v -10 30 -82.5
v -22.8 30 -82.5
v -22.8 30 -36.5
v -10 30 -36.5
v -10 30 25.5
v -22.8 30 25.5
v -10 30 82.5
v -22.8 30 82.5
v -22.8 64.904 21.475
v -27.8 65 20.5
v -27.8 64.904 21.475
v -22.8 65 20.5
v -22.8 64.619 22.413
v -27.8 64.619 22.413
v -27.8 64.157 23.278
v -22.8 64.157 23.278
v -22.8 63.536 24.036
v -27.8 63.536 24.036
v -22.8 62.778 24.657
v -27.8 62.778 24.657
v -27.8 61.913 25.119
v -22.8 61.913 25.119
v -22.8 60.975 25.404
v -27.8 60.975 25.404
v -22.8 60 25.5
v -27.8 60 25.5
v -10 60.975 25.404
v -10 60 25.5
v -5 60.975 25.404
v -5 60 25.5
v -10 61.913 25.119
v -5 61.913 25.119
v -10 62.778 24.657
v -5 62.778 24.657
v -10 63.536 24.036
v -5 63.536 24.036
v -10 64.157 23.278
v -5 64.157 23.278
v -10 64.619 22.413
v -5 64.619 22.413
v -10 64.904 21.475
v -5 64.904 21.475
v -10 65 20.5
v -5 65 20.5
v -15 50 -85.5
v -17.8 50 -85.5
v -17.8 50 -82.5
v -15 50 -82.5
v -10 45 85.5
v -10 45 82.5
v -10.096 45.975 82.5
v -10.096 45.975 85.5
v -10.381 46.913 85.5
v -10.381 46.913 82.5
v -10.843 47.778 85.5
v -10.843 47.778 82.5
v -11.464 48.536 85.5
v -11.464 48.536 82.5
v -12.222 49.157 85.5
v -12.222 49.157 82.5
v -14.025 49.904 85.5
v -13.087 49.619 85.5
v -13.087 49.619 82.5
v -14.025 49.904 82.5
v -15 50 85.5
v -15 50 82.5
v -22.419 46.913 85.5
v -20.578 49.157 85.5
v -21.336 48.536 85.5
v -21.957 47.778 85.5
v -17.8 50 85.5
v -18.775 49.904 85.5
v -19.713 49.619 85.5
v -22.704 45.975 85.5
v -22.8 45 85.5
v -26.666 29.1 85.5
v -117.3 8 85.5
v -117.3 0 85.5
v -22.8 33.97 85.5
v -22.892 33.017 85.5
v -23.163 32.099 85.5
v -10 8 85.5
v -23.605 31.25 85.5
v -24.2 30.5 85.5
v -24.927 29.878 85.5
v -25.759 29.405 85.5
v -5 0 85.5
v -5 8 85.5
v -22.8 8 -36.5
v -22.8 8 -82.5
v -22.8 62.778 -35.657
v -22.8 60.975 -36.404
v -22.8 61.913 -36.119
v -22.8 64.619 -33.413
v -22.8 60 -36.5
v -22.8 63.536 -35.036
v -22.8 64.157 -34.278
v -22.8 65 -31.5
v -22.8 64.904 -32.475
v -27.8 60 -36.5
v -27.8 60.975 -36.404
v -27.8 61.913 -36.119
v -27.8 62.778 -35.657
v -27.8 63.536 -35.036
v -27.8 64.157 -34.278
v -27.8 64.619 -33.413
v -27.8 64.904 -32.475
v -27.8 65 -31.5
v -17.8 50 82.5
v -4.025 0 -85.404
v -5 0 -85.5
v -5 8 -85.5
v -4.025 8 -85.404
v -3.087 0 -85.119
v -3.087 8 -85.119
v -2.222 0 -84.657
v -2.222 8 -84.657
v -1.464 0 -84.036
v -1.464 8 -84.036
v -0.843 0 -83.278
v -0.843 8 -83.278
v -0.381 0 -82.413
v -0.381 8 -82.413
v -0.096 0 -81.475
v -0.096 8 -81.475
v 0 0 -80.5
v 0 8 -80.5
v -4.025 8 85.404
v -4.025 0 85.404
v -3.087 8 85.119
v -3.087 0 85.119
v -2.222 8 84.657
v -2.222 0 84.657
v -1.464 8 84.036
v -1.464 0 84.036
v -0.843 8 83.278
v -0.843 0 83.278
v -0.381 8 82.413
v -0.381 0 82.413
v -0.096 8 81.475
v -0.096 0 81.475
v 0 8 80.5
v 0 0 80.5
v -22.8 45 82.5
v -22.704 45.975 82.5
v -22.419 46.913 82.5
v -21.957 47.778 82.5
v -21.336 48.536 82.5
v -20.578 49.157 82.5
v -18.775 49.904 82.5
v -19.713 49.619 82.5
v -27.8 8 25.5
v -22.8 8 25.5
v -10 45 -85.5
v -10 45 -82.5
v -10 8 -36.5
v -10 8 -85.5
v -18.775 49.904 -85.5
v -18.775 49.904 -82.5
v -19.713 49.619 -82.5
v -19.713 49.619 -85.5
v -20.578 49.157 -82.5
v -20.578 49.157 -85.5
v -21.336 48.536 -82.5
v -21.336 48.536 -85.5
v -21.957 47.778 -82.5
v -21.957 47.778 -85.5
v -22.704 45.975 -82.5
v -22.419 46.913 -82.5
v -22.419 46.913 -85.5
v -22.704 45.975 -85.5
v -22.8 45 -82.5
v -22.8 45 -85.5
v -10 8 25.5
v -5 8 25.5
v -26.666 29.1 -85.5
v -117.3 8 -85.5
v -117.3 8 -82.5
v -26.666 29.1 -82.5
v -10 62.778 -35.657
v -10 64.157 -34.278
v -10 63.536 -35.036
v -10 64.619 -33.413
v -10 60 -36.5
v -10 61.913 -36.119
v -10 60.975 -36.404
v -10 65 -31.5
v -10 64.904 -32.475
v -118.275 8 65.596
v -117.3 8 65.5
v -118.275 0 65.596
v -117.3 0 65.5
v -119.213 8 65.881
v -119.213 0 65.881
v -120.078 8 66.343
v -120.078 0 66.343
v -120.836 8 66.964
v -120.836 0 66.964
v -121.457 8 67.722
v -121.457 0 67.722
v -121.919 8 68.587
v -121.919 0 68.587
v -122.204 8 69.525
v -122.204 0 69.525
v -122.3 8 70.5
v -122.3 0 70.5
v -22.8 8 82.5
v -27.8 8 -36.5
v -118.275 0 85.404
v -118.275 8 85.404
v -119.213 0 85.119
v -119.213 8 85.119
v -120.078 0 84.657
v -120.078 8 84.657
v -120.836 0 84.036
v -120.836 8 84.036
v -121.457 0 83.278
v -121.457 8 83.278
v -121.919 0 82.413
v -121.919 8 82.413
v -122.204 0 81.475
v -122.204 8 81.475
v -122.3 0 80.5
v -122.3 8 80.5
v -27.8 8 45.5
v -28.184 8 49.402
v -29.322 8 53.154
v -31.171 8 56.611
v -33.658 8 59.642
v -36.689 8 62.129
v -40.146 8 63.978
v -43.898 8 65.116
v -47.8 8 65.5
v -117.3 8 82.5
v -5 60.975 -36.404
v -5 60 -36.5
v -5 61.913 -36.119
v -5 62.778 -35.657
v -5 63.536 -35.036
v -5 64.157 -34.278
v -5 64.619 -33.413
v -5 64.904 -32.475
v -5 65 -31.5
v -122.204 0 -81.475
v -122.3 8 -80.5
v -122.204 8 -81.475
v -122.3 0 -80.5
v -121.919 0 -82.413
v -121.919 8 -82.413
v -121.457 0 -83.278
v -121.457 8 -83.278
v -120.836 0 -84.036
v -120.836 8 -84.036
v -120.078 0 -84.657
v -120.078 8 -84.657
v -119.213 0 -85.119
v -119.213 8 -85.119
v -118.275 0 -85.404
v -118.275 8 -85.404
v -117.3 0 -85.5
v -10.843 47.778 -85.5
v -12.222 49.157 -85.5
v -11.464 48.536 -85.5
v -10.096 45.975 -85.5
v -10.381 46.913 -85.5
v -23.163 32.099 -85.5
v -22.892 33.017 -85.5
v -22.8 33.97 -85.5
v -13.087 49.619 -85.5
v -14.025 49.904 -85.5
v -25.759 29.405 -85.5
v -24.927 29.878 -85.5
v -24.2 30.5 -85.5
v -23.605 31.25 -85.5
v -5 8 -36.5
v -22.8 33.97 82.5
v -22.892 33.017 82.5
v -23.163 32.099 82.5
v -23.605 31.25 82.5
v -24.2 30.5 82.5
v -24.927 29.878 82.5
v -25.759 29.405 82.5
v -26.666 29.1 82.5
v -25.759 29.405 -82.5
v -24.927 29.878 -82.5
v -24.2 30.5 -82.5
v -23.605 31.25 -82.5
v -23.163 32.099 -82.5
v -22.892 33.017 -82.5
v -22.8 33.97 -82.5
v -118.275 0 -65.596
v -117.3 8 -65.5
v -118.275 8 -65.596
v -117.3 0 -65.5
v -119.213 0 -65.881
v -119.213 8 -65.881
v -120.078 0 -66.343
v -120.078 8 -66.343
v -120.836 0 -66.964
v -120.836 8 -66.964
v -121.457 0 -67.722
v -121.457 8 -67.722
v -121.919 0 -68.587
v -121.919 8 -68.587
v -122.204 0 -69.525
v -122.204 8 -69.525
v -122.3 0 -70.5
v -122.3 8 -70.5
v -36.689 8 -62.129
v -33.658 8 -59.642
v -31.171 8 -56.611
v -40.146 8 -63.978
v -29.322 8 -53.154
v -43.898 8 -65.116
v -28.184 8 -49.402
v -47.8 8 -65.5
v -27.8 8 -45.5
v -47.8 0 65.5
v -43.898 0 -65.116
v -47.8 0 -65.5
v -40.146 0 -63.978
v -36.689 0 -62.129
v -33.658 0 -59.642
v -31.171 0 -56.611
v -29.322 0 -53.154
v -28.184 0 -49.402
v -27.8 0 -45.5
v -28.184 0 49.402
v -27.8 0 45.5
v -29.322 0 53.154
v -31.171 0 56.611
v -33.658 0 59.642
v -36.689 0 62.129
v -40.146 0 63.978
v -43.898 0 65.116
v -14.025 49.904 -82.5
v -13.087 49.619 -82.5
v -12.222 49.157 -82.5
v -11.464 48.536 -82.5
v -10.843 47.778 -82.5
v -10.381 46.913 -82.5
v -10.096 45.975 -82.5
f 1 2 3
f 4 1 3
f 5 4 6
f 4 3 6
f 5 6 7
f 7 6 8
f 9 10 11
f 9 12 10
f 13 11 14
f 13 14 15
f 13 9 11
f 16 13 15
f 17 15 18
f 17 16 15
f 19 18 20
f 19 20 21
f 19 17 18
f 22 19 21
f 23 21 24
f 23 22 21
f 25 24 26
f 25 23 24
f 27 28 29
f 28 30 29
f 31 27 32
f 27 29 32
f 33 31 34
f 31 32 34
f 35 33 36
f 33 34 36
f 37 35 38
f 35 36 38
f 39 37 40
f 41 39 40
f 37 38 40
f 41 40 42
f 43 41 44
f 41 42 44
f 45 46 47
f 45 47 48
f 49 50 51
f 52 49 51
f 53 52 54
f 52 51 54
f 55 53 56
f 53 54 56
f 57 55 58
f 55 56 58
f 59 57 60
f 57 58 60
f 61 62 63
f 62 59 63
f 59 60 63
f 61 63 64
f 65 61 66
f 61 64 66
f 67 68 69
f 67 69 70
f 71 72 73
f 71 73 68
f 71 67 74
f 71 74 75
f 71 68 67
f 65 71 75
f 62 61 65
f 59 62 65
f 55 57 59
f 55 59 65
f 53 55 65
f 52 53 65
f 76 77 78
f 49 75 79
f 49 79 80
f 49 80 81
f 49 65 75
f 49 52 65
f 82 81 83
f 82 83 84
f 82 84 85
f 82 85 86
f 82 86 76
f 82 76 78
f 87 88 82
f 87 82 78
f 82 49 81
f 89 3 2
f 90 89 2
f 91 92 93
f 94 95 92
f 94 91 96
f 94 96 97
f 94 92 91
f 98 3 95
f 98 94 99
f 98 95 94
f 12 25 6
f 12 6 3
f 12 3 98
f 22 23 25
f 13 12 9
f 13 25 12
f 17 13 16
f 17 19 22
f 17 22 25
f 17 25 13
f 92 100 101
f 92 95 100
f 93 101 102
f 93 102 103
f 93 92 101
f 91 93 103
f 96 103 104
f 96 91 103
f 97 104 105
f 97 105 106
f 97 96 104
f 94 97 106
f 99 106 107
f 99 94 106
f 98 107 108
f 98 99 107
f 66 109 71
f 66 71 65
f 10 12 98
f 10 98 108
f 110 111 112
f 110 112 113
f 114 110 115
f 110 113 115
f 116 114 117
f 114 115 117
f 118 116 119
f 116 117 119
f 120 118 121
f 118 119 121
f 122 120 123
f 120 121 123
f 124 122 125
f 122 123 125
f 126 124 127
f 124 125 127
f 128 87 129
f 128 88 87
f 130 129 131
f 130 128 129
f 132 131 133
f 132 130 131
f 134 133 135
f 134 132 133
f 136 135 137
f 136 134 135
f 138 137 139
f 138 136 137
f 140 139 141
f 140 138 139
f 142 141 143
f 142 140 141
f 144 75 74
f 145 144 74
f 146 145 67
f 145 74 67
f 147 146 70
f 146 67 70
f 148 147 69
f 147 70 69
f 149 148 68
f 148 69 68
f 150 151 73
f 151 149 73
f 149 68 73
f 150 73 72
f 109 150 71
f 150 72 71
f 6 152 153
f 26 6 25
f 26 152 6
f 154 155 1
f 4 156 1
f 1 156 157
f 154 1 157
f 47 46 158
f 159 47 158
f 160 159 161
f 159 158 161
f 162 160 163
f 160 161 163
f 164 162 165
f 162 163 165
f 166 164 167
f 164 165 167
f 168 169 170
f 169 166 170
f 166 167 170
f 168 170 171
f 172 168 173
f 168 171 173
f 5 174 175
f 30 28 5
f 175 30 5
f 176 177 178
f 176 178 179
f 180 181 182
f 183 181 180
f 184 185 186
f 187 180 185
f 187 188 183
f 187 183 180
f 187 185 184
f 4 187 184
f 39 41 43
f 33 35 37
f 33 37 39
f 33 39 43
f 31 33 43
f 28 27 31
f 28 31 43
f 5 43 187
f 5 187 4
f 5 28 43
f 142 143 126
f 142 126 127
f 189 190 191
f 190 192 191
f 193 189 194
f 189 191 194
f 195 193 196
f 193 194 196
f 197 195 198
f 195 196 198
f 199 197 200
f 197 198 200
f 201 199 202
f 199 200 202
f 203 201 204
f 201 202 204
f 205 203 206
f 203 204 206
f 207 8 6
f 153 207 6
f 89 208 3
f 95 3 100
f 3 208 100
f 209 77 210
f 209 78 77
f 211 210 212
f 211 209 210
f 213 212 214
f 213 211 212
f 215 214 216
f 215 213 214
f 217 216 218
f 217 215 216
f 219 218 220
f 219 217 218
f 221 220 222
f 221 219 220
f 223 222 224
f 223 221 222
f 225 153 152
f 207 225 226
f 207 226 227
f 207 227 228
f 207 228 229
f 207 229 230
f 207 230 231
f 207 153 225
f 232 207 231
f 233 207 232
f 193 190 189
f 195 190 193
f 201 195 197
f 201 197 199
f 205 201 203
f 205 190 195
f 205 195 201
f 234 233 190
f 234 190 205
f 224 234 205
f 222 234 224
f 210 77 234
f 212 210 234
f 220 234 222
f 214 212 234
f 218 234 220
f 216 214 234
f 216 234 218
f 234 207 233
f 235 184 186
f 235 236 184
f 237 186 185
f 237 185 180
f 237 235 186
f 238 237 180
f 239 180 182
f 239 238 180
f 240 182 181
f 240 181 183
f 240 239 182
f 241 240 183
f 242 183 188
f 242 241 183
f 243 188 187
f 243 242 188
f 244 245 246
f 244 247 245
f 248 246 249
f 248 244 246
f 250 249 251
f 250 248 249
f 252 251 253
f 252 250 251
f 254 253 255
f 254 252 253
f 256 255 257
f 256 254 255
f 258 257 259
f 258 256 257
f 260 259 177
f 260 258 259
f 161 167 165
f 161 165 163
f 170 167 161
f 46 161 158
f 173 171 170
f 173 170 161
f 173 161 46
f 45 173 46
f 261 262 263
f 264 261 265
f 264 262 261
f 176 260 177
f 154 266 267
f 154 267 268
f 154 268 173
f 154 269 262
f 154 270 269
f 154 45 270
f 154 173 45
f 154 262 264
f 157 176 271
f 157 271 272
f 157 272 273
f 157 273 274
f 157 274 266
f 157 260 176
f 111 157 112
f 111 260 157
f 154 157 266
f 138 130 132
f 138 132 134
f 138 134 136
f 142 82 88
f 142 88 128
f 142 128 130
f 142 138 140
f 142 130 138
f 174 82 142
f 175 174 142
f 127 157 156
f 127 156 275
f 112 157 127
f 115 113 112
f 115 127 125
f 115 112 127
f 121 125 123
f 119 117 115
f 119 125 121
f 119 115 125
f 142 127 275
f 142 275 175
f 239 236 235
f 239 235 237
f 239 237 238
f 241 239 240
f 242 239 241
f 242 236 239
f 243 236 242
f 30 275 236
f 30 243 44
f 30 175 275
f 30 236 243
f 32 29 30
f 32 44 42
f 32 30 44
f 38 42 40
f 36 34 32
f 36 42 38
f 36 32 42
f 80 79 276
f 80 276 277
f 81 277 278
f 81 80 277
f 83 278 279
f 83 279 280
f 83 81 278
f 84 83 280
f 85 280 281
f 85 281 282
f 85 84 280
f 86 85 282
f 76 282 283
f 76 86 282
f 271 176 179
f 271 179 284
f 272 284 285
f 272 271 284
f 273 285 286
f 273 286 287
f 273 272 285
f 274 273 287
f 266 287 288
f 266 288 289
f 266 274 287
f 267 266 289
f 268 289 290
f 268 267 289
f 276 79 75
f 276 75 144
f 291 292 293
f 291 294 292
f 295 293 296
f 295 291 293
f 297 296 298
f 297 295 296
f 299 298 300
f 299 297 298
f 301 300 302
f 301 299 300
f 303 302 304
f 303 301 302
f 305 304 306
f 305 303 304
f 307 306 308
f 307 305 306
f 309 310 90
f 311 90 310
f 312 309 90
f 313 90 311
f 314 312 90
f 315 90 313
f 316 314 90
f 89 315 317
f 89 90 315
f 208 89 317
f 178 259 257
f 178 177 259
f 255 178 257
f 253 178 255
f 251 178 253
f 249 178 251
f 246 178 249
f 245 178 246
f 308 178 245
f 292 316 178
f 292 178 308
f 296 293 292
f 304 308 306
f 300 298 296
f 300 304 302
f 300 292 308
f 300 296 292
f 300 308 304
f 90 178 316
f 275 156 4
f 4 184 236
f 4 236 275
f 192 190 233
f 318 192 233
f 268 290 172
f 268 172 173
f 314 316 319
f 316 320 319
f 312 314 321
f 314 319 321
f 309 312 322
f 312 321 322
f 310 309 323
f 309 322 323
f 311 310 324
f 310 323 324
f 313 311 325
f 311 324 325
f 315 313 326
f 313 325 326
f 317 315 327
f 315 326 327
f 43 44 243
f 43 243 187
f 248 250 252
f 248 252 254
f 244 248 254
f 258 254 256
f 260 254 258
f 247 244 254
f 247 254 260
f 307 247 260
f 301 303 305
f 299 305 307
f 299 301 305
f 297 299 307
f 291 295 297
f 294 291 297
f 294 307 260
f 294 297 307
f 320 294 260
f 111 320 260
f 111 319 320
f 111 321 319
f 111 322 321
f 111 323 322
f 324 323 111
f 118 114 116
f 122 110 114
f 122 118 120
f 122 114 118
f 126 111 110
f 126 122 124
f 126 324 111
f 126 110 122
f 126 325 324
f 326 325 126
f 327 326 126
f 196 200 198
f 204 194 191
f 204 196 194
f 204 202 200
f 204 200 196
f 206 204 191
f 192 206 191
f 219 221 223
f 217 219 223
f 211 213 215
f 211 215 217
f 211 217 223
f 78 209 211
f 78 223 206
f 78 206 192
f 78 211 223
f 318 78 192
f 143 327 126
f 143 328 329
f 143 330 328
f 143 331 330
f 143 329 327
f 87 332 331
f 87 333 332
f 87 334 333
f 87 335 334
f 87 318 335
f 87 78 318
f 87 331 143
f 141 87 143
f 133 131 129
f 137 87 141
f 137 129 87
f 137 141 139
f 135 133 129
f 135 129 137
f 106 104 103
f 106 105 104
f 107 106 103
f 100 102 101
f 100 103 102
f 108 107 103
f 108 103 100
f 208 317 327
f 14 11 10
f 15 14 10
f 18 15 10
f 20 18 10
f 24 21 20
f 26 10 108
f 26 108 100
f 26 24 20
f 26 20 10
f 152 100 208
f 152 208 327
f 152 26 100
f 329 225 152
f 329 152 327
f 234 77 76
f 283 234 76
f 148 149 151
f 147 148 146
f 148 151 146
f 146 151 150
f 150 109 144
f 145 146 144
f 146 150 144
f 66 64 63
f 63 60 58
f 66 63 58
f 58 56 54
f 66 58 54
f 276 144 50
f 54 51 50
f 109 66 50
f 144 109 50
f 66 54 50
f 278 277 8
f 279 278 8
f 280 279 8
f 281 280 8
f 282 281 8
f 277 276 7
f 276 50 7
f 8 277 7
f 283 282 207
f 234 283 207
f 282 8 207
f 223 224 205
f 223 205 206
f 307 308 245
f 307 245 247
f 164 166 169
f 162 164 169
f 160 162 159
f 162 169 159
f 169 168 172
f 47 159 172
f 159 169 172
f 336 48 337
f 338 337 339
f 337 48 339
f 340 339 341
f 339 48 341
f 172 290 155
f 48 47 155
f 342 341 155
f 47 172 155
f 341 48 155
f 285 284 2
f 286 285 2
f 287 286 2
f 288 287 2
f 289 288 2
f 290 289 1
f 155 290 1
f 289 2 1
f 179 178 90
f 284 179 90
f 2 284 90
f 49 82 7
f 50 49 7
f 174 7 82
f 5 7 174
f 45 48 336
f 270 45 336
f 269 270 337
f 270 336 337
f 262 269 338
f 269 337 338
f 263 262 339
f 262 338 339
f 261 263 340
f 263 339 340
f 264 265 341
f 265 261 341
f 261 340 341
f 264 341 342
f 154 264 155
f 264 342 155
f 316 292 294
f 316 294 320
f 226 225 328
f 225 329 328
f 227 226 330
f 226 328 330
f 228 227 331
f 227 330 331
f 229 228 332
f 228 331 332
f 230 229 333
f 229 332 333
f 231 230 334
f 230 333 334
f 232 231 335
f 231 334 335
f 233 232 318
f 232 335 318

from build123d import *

# Parameters (mm, degrees)
P_IDAT_VYSUNUT_M1_DEPTH  = 85.5
SKICA2_W                 = 49
SKICA2_H                 = 35
SKICA2_W_2               = 60
ODEBRAT_VYSUNUT_M1_DEPTH = 144.057680675
SKICA3_W                 = 5
SKICA3_H                 = 49
SKICA3_H_2               = 60
ODEBRAT_VYSUNUT_M2_DEPTH = 22
SKICA4_W                 = 94.5
SKICA4_H                 = 131
ODEBRAT_VYSUNUT_M3_DEPTH = 160.73897458
ZAOBLIT1_R               = 5
ZAOBLIT2_R               = 20
ZAOBLIT3_R               = 5
P_IDAT_VYSUNUT_M2_DEPTH  = 3
SKICA6_W                 = 12.8
SKICA6_H                 = 3
P_IDAT_VYSUNUT_M3_DEPTH  = 20
ZAOBLIT4_R               = 5


with BuildPart() as part:
    # Skica1 → Přidat vysunutím1 (new, symmetric)
    with BuildSketch(Plane.XY):
        Polygon((-27.8, 65), (-27.8, 8), (-122.3, 8), (-122.3, 0), (0, 0), (0, 8), (-5, 8), (-5, 65), (-10, 65), (-10, 30), (-22.8, 30), (-22.8, 65), align=None)
    extrude(amount=P_IDAT_VYSUNUT_M1_DEPTH, both=True)

    # Skica2 → Odebrat vysunutím1 (cut, through all)
    with BuildSketch(Plane.ZY.offset(27.8)):
        with Locations((-61, 47.5)):
            Rectangle(SKICA2_W, SKICA2_H)
        with Locations((55.5, 47.5)):
            Rectangle(SKICA2_W_2, SKICA2_H)
    extrude(amount=-ODEBRAT_VYSUNUT_M1_DEPTH, mode=Mode.SUBTRACT)

    # Skica3 → Odebrat vysunutím2 (cut)
    with BuildSketch(Plane(origin=(0, 30, 0), x_dir=(1, 0, 0), z_dir=(0, 1, 0))):
        with Locations((-25.3, 61)):
            Rectangle(SKICA3_W, SKICA3_H)
        with Locations((-7.5, 61)):
            Rectangle(SKICA3_W, SKICA3_H)
        with Locations((-25.3, -55.5)):
            Rectangle(SKICA3_W, SKICA3_H_2)
        with Locations((-7.5, -55.5)):
            Rectangle(SKICA3_W, SKICA3_H_2)
    extrude(amount=-ODEBRAT_VYSUNUT_M2_DEPTH, mode=Mode.SUBTRACT)

    # Skica4 → Odebrat vysunutím3 (cut, through all)
    with BuildSketch(Plane(origin=(0, 8, 0), x_dir=(1, 0, 0), z_dir=(0, 1, 0))):
        with Locations((-75.05, 0)):
            Rectangle(SKICA4_W, SKICA4_H)
    extrude(amount=-ODEBRAT_VYSUNUT_M3_DEPTH, mode=Mode.SUBTRACT)

    # Zaoblit1
    zaoblit1_edges = [part.edges().sort_by_distance(p)[0] for p in [
        (0, 4, -85.5),
        (-122.3, 4, 65.5),
        (-122.3, 4, -65.5),
        (-122.3, 4, -85.5),
        (-122.3, 4, 85.5),
        (0, 4, 85.5),
    ]]
    fillet(zaoblit1_edges, radius=ZAOBLIT1_R)

    # Zaoblit2
    zaoblit2_edges = [part.edges().sort_by_distance(p)[0] for p in [
        (-27.8, 4, -65.5),
        (-27.8, 4, 65.5),
    ]]
    fillet(zaoblit2_edges, radius=ZAOBLIT2_R)

    # Zaoblit3
    zaoblit3_edges = [part.edges().sort_by_distance(p)[0] for p in [
        (-7.5, 65, -36.5),
        (-25.3, 65, -36.5),
        (-25.3, 65, 25.5),
        (-7.5, 65, 25.5),
    ]]
    fillet(zaoblit3_edges, radius=ZAOBLIT3_R)

    # Skica5 → Přidat vysunutím2 (add)
    with BuildSketch(Plane(origin=(0, 0, -85.5), x_dir=(-1, 0, 0), z_dir=(0, 0, -1))):
        Polygon((22.8, 30), (22.8, 8), (117.3, 8), align=None)
    p_idat_vysunut_m2 = extrude(amount=-P_IDAT_VYSUNUT_M2_DEPTH)

    # Zrcadlit1: Přidat vysunutím2 across plane
    add(p_idat_vysunut_m2.mirror(Plane.XY))

    # Skica6 → Přidat vysunutím3 (add)
    with BuildSketch(Plane(origin=(0, 30, 0), x_dir=(1, 0, 0), z_dir=(0, 1, 0))):
        with Locations((-16.4, 84)):
            Rectangle(SKICA6_W, SKICA6_H)
        with Locations((-16.4, -84)):
            Rectangle(SKICA6_W, SKICA6_H)
    extrude(amount=P_IDAT_VYSUNUT_M3_DEPTH)

    # Zaoblit4
    # the kernel refuses this fillet: 5 mm, written as the material it adds along each edge
    with BuildSketch(Plane(origin=(-22.8, 30, 85.5), x_dir=(0, 1, 0), z_dir=(0, 0, -1)), Plane(origin=(-22.8, 30, -85.5), x_dir=(-0.9739551200282253, -0.22674087450392655, 0), z_dir=(0, 0, 1))) as zaoblit4_piece_1:
        with BuildLine():
            CenterArc((ZAOBLIT4_R * 0.793937122558, -ZAOBLIT4_R), ZAOBLIT4_R, 90, 76.89473101)
            Line((-ZAOBLIT4_R * 0.18001799747, -ZAOBLIT4_R * 0.773259125496), (0, 0))
            Line((0, 0), (ZAOBLIT4_R * 0.793937122558, 0))
        make_face()
    extrude(amount=3)
    # the kernel refuses this fillet: 5 mm, written as the material it takes off along each edge
    with BuildSketch(Plane(origin=(-22.8, 50, -98), x_dir=(1, 0, 0), z_dir=(0, 0, 1)), Plane(origin=(-10, 50, 70), x_dir=(0, -1, 0), z_dir=(0, 0, 1))) as zaoblit4_2_piece_1:
        with BuildLine():
            CenterArc((ZAOBLIT4_R, -ZAOBLIT4_R), ZAOBLIT4_R, 90, 90)
            Line((0, -ZAOBLIT4_R), (0, 0))
            Line((0, 0), (ZAOBLIT4_R, 0))
        make_face()
    extrude(amount=28, mode=Mode.SUBTRACT)
    with BuildSketch(Plane(origin=(-10, 50, -70), x_dir=(0, -1, 0), z_dir=(0, 0, -1)), Plane(origin=(-22.8, 50, 98), x_dir=(1, 0, 0), z_dir=(0, 0, -1))) as zaoblit4_2_piece_2:
        with BuildLine():
            CenterArc((ZAOBLIT4_R, ZAOBLIT4_R), ZAOBLIT4_R, 180, 90)
            Line((0, ZAOBLIT4_R), (0, 0))
            Line((0, 0), (ZAOBLIT4_R, 0))
        make_face()
    extrude(amount=28, mode=Mode.SUBTRACT)


solid = part.part
